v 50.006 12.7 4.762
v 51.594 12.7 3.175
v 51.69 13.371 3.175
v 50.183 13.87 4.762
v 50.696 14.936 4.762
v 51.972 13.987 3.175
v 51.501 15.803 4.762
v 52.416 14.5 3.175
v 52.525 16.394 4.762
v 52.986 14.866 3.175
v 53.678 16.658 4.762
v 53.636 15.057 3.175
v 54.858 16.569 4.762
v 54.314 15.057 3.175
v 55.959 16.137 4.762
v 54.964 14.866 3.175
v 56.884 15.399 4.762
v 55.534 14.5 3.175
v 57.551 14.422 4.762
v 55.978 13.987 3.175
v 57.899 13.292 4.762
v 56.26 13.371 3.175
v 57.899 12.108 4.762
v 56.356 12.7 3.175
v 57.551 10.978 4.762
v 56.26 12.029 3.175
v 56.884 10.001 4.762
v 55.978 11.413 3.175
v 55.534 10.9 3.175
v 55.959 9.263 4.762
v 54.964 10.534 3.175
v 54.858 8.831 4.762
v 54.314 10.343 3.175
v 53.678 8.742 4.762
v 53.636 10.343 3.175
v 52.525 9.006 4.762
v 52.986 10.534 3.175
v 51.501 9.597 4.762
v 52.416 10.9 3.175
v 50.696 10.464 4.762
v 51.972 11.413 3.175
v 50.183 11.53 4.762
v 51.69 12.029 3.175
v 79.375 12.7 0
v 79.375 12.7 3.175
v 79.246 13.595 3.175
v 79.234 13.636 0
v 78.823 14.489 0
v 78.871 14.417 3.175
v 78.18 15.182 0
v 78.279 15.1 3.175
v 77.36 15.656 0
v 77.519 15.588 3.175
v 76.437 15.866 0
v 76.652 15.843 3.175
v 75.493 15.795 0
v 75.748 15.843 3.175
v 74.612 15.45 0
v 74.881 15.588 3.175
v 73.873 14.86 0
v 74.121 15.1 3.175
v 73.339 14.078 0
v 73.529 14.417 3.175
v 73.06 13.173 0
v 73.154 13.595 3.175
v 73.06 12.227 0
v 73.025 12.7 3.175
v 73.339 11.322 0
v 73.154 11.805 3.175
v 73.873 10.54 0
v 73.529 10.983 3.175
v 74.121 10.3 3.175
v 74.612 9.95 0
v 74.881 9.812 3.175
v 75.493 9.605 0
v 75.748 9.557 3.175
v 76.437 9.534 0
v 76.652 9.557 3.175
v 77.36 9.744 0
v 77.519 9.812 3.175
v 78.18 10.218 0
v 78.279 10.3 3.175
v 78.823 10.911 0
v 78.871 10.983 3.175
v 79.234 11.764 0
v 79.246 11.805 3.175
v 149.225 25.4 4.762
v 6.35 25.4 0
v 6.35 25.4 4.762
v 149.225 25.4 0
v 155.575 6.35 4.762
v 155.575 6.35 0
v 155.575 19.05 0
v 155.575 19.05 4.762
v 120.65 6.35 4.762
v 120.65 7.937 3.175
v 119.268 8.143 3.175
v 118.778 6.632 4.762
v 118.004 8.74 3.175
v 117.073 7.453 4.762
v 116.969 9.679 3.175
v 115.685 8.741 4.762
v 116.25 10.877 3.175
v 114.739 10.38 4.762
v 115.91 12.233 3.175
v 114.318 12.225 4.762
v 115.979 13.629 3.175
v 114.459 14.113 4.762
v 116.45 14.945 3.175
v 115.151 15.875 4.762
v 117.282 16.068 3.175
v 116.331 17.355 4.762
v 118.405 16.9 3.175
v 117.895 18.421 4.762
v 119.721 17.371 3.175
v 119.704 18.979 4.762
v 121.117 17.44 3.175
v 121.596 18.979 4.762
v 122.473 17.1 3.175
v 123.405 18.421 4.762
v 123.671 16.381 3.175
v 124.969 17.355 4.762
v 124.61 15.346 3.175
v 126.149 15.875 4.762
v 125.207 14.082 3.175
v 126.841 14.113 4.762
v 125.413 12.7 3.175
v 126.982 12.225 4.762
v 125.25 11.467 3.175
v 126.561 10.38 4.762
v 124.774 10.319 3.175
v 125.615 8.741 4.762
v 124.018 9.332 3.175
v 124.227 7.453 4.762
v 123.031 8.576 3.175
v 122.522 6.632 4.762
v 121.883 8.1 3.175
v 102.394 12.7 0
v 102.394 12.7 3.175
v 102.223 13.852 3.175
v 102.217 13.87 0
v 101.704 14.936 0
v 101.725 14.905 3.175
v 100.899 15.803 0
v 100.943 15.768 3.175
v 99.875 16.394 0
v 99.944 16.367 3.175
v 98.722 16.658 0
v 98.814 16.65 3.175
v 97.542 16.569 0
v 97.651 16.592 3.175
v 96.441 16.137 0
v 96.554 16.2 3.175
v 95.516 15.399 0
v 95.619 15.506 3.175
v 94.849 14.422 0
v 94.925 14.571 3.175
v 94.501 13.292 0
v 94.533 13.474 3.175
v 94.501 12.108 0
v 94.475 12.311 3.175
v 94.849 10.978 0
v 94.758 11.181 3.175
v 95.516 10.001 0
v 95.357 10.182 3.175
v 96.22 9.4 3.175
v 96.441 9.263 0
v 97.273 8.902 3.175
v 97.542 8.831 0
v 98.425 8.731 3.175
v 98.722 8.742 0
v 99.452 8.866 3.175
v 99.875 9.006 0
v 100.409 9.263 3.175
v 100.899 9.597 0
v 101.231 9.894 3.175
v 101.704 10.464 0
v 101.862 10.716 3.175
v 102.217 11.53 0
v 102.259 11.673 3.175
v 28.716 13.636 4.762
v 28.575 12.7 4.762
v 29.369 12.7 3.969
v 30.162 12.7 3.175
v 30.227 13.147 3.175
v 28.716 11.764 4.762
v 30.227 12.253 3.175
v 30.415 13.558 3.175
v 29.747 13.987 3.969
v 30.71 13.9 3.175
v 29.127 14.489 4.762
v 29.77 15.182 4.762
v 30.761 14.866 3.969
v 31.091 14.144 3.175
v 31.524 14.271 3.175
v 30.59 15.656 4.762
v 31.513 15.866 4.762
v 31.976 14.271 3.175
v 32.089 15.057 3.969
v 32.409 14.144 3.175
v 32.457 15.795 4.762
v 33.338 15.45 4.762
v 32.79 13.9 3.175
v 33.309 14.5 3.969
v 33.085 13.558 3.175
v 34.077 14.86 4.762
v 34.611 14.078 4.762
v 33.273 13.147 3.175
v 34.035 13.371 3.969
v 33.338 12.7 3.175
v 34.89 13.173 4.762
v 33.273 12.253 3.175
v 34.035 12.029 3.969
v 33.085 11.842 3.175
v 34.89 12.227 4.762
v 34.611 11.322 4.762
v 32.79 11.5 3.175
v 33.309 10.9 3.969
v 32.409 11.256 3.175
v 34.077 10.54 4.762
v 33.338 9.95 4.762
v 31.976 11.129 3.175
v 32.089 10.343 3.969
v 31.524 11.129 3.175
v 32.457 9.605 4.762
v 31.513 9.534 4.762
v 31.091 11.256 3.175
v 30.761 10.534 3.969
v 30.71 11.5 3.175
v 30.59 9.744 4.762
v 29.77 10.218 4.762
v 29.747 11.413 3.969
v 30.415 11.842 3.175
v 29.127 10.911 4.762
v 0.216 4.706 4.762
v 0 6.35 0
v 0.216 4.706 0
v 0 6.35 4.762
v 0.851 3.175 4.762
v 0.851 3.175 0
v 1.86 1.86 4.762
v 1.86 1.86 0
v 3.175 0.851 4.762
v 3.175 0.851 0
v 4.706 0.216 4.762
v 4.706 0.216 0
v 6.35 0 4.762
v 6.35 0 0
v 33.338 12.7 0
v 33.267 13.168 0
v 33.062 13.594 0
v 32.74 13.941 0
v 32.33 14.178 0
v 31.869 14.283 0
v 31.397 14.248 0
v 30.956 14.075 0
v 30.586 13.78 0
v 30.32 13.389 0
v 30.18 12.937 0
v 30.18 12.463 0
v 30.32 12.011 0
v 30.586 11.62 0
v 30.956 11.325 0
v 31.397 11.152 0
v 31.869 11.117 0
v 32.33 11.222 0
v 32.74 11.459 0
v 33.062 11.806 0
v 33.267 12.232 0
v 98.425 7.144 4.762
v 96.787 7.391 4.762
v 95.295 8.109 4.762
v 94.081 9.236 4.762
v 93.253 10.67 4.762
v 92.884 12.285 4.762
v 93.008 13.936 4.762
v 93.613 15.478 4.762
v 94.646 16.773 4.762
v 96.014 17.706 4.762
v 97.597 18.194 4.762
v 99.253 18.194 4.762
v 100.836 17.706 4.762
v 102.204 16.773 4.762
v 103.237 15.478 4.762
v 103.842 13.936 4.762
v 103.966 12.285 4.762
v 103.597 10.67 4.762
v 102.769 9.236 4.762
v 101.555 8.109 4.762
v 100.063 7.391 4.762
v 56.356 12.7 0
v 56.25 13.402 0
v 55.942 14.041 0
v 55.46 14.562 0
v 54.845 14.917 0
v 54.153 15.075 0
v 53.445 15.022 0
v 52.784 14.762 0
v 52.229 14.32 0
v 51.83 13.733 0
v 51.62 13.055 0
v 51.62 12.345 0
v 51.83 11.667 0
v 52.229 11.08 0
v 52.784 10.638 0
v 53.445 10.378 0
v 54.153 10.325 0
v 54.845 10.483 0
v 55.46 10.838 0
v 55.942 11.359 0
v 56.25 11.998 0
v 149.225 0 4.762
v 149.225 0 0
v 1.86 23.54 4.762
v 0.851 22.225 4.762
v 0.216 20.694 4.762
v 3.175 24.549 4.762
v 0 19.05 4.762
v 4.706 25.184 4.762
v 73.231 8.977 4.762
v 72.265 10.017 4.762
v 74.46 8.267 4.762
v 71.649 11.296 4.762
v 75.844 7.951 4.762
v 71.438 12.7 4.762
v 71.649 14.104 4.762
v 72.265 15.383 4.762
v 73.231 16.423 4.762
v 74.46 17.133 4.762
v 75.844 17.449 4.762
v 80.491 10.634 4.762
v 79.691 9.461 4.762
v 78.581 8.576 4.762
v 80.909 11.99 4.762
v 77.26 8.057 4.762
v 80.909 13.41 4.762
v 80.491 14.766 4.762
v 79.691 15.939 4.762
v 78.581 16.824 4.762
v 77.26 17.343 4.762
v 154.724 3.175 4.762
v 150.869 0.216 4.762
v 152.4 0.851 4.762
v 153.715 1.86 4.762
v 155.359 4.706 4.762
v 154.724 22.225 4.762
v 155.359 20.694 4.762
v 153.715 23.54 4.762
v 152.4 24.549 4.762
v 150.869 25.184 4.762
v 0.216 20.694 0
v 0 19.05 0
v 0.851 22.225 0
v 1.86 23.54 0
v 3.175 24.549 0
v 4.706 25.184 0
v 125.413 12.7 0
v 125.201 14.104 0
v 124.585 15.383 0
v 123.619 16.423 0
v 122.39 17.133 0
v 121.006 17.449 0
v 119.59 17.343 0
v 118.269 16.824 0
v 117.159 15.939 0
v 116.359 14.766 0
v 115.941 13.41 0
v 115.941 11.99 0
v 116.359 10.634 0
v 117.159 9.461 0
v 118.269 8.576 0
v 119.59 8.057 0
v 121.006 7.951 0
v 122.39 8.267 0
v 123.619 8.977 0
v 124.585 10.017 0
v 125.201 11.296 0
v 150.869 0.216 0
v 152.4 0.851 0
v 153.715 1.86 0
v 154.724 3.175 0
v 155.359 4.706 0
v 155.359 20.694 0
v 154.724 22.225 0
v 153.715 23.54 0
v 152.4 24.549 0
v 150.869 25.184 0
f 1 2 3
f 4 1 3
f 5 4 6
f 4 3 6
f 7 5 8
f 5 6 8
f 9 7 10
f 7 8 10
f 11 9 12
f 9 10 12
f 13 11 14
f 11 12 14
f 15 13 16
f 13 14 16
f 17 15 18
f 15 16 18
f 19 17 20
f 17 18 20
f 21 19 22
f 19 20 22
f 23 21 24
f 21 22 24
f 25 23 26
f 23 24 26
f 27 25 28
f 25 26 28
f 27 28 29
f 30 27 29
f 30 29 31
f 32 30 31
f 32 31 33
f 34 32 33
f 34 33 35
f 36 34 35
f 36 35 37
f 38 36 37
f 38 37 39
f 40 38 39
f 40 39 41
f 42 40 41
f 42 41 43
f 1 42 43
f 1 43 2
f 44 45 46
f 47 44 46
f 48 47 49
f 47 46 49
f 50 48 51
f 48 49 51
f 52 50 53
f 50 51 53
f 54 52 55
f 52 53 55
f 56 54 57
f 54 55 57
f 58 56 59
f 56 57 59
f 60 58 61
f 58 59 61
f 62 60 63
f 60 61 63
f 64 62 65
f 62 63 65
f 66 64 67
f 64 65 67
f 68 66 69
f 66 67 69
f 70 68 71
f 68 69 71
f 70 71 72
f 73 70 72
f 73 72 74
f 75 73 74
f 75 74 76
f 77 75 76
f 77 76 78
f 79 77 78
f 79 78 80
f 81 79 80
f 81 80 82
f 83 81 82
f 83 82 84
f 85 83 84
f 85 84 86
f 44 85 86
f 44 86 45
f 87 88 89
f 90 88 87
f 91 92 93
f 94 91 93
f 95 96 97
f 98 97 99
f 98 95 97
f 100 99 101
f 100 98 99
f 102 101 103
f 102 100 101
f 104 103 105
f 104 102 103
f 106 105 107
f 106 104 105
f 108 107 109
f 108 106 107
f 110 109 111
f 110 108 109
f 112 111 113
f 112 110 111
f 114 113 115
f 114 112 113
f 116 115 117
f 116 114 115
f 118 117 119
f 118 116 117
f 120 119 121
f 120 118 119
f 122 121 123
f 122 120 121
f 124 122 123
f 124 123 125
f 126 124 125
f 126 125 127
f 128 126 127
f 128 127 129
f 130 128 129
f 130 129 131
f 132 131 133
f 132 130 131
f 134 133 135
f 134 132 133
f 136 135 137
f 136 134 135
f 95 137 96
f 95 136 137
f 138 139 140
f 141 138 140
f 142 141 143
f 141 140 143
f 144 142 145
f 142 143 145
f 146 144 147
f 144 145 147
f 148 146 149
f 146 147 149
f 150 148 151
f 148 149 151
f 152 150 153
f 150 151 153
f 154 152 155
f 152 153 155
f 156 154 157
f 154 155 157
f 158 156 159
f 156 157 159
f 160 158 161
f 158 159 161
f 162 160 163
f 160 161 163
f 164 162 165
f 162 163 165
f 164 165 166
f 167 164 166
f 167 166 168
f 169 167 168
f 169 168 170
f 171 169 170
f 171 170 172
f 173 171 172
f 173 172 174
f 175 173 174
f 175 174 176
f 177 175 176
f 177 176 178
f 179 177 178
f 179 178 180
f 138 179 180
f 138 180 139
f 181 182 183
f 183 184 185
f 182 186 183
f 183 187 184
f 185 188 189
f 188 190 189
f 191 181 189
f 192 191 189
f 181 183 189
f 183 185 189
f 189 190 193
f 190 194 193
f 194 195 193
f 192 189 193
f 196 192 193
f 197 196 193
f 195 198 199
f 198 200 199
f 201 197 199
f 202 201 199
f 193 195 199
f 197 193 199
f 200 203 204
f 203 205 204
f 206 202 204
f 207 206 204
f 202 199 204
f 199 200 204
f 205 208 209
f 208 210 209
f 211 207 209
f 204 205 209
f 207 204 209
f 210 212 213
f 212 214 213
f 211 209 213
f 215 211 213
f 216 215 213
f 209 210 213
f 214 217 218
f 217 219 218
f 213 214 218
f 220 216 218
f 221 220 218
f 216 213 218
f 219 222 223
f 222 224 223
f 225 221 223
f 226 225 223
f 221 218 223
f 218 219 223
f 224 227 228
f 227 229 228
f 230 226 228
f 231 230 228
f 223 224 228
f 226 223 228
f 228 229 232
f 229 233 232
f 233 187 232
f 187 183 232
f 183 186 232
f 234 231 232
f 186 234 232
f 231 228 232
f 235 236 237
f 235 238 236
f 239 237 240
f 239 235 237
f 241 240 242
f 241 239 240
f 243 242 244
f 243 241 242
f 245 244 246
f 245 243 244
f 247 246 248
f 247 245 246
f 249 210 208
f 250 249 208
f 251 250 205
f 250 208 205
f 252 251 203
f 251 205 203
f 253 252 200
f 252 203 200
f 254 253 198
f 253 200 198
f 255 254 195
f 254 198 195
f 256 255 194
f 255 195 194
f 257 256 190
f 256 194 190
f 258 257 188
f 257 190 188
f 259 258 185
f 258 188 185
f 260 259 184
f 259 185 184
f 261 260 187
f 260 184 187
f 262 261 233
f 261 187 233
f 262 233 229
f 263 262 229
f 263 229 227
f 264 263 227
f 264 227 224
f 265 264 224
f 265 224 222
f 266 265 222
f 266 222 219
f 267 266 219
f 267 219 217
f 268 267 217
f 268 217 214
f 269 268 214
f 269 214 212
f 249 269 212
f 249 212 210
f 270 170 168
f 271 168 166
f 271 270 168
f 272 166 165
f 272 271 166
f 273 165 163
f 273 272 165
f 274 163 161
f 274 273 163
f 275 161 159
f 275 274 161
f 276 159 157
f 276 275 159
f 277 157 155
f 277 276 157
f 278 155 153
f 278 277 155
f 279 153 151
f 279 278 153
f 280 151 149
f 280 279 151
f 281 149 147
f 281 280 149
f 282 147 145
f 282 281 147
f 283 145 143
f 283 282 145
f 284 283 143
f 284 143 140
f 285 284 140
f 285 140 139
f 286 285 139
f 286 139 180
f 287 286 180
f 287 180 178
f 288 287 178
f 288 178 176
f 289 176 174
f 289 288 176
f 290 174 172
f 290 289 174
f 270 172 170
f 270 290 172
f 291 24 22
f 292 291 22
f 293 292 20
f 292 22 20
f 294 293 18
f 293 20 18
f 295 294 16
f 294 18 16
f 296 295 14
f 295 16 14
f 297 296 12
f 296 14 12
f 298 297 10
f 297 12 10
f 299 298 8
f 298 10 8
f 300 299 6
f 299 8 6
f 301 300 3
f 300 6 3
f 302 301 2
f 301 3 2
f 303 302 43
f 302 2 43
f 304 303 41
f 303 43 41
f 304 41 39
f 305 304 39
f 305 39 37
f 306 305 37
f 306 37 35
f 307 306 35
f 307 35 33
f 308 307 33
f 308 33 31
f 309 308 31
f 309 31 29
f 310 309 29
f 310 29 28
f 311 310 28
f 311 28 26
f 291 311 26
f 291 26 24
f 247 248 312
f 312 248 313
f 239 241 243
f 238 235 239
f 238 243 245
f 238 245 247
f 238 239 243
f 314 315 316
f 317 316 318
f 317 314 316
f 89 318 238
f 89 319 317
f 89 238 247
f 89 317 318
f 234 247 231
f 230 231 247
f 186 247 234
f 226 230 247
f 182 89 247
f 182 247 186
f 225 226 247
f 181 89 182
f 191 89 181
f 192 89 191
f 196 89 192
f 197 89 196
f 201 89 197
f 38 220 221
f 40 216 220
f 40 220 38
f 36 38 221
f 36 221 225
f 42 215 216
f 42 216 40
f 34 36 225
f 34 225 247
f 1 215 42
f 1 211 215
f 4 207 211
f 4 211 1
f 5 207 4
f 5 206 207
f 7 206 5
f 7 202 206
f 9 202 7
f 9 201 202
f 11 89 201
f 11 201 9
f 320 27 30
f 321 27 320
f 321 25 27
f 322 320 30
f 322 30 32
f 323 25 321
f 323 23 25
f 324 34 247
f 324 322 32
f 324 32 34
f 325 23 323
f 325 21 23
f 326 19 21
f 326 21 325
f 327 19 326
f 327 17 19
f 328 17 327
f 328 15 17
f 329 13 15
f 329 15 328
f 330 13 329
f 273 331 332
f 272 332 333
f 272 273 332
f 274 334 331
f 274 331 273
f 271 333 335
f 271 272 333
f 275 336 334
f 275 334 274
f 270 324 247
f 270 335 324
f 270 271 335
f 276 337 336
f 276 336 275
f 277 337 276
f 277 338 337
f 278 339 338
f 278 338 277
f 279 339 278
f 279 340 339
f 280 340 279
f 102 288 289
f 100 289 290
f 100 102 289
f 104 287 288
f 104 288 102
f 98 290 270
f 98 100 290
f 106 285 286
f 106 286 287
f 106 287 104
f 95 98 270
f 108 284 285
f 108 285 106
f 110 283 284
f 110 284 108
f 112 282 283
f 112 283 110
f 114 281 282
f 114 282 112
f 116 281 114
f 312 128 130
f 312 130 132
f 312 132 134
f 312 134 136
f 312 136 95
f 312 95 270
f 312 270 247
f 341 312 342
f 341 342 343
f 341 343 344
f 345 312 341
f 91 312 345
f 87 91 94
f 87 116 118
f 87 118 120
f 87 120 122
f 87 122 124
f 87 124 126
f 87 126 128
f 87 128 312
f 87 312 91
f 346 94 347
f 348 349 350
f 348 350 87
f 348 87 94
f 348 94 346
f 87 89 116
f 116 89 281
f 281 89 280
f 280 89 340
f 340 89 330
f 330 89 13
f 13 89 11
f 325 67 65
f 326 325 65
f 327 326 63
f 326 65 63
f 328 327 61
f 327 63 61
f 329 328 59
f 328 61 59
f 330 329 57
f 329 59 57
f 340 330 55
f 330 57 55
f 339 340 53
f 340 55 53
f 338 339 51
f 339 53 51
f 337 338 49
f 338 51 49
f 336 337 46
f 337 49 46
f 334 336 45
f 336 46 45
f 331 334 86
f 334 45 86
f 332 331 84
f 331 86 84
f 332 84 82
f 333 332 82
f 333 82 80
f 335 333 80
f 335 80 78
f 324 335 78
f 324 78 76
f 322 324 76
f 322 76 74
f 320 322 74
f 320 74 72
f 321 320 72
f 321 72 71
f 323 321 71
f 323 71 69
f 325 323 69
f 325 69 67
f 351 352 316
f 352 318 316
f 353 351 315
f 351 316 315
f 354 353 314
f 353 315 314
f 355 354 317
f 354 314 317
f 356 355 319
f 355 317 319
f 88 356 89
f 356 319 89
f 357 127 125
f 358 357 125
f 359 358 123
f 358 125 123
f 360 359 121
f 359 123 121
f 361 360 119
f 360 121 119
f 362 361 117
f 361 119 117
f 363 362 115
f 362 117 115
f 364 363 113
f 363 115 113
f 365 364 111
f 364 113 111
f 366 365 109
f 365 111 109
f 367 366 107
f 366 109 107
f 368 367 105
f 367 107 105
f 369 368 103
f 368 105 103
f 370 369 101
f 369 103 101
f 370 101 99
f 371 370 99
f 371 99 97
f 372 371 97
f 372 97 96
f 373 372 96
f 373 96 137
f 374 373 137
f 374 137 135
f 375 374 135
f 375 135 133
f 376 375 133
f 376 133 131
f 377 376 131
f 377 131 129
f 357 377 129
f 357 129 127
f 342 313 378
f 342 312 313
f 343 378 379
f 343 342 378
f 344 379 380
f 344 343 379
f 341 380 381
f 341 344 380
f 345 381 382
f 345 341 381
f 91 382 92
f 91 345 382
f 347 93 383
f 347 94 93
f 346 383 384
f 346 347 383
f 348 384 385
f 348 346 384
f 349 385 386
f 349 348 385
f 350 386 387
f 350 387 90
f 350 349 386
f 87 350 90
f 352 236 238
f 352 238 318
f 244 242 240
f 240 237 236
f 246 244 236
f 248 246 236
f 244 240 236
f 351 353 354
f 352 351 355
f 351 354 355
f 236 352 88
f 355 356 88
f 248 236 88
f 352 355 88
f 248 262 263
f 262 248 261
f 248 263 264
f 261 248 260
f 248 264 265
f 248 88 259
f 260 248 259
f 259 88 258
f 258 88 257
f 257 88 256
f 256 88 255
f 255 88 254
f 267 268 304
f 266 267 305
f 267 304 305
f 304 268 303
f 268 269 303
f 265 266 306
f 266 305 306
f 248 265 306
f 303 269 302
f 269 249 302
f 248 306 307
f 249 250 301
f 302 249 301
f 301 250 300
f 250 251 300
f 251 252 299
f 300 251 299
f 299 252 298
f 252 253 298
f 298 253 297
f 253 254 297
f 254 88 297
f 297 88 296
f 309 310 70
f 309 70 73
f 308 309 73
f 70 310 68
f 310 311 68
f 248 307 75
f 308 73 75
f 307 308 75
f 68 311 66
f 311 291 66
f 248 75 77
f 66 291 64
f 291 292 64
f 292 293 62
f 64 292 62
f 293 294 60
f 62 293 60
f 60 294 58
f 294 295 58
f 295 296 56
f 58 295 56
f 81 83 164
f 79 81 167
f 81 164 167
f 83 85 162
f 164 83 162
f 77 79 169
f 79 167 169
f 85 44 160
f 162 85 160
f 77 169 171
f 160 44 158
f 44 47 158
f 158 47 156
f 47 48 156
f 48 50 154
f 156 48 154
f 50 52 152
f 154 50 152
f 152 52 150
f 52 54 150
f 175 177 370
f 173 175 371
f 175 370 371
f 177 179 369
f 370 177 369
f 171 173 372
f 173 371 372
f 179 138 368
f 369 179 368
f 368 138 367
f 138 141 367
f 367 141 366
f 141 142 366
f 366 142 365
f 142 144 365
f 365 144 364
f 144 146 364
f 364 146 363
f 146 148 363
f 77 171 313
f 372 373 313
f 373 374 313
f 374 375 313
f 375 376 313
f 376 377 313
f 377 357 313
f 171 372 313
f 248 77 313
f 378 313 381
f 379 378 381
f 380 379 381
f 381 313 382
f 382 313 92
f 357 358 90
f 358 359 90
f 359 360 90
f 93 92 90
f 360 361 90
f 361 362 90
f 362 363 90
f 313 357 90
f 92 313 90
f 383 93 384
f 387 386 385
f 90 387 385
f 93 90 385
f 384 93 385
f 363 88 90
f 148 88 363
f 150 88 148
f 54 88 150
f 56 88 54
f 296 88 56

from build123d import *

# Parameters (mm, degrees)
SKETCH2_W                                        = 155.575
SKETCH2_H                                        = 25.4
BOSS_EXTRUDE2_DEPTH                              = 4.7625
FILLET1_R                                        = 6.35
SKETCH3_R                                        = 1.5875
SKETCH3_R_2                                      = 2.38125
SKETCH3_R_3                                      = 3.175
SKETCH3_R_4                                      = 3.96875
SKETCH3_R_5                                      = 4.7625
CUT_EXTRUDE1_DEPTH                               = 158.706759624
CSK_FOR_M10_FLAT_HEAD_MACHINE_SCREW3_D           = 3.175
CSK_FOR_M10_FLAT_HEAD_MACHINE_SCREW3_CSINK_D     = 6.35
CSK_FOR_M10_FLAT_HEAD_MACHINE_SCREW3_CSINK_ANGLE = 90
CSK_FOR_M10_FLAT_HEAD_MACHINE_SCREW4_D           = 4.7625
CSK_FOR_M10_FLAT_HEAD_MACHINE_SCREW4_CSINK_D     = 7.9375
CSK_FOR_M10_FLAT_HEAD_MACHINE_SCREW4_CSINK_ANGLE = 90
CSK_FOR_M10_FLAT_HEAD_MACHINE_SCREW5_D           = 6.35
CSK_FOR_M10_FLAT_HEAD_MACHINE_SCREW5_CSINK_D     = 9.525
CSK_FOR_M10_FLAT_HEAD_MACHINE_SCREW5_CSINK_ANGLE = 90


with BuildPart() as part:
    # Sketch2 → Boss-Extrude2 (new body)
    with BuildSketch(Plane.XY):
        with Locations((77.7875, 12.7)):
            Rectangle(SKETCH2_W, SKETCH2_H)
    extrude(amount=BOSS_EXTRUDE2_DEPTH)

    # Fillet1
    fillet1_edges = [part.edges().sort_by_distance(p)[0] for p in [
        (0, 25.4, 2.38125),
        (155.575, 25.4, 2.38125),
        (155.575, 0, 2.38125),
        (0, 0, 2.38125),
    ]]
    fillet(fillet1_edges, radius=FILLET1_R)

    # Sketch3 → Cut-Extrude1 (cut, through all)
    with BuildSketch(Plane.XY.offset(4.7625)):
        with Locations((31.75, 12.7)):
            Circle(SKETCH3_R)
        with Locations((53.975, 12.7)):
            Circle(SKETCH3_R_2)
        with Locations((76.2, 12.7)):
            Circle(SKETCH3_R_3)
        with Locations((98.425, 12.7)):
            Circle(SKETCH3_R_4)
        with Locations((120.65, 12.7)):
            Circle(SKETCH3_R_5)
    extrude(amount=-CUT_EXTRUDE1_DEPTH, mode=Mode.SUBTRACT)

    # CSK for M10 Flat Head Machine Screw3 (through all)
    with Locations(Plane(origin=(31.75, 12.7, 4.7625), x_dir=(1, 0, 0), z_dir=(0, 0, 1))):
        with Locations((0, 0)):
            CounterSinkHole(CSK_FOR_M10_FLAT_HEAD_MACHINE_SCREW3_D / 2, CSK_FOR_M10_FLAT_HEAD_MACHINE_SCREW3_CSINK_D / 2, counter_sink_angle=CSK_FOR_M10_FLAT_HEAD_MACHINE_SCREW3_CSINK_ANGLE)

    # CSK for M10 Flat Head Machine Screw4 (through all)
    with Locations(Plane(origin=(53.975, 12.7, 4.7625), x_dir=(1, 0, 0), z_dir=(0, 0, 1))):
        with Locations((0, 0)):
            CounterSinkHole(CSK_FOR_M10_FLAT_HEAD_MACHINE_SCREW4_D / 2, CSK_FOR_M10_FLAT_HEAD_MACHINE_SCREW4_CSINK_D / 2, counter_sink_angle=CSK_FOR_M10_FLAT_HEAD_MACHINE_SCREW4_CSINK_ANGLE)

    # CSK for M10 Flat Head Machine Screw5 (through all)
    with Locations(Plane(origin=(76.2, 12.7, 4.7625), x_dir=(1, 0, 0), z_dir=(0, 0, 1))):
        with Locations((0, 0)):
            CounterSinkHole(CSK_FOR_M10_FLAT_HEAD_MACHINE_SCREW5_D / 2, CSK_FOR_M10_FLAT_HEAD_MACHINE_SCREW5_CSINK_D / 2, counter_sink_angle=CSK_FOR_M10_FLAT_HEAD_MACHINE_SCREW5_CSINK_ANGLE)

    # Sketch14 → CSK for M10 Flat Head Machine Screw6 (revolve, cut)
    with BuildSketch(Plane(origin=(98.425, 12.7, 4.7625), x_dir=(0, -1, 0), z_dir=(1, 0, 0))):
        Polygon((0, 0), (0, 4.7625), (3.96875, 4.7625), (3.96875, 1.5875), (5.55625, 0), align=None)
    revolve(axis=Axis((98.425, 12.7, 11.1125), (0, 0, -1)), mode=Mode.SUBTRACT)

    # Sketch15 → CSK for M10 Flat Head Machine Screw7 (revolve, cut)
    with BuildSketch(Plane(origin=(120.65, 12.7, 4.7625), x_dir=(0, -1, 0), z_dir=(1, 0, 0))):
        Polygon((0, 0), (0, 4.7625), (4.7625, 4.7625), (4.7625, 1.5875), (6.35, 0), align=None)
    revolve(axis=Axis((120.65, 12.7, 11.1125), (0, 0, -1)), mode=Mode.SUBTRACT)


solid = part.part
